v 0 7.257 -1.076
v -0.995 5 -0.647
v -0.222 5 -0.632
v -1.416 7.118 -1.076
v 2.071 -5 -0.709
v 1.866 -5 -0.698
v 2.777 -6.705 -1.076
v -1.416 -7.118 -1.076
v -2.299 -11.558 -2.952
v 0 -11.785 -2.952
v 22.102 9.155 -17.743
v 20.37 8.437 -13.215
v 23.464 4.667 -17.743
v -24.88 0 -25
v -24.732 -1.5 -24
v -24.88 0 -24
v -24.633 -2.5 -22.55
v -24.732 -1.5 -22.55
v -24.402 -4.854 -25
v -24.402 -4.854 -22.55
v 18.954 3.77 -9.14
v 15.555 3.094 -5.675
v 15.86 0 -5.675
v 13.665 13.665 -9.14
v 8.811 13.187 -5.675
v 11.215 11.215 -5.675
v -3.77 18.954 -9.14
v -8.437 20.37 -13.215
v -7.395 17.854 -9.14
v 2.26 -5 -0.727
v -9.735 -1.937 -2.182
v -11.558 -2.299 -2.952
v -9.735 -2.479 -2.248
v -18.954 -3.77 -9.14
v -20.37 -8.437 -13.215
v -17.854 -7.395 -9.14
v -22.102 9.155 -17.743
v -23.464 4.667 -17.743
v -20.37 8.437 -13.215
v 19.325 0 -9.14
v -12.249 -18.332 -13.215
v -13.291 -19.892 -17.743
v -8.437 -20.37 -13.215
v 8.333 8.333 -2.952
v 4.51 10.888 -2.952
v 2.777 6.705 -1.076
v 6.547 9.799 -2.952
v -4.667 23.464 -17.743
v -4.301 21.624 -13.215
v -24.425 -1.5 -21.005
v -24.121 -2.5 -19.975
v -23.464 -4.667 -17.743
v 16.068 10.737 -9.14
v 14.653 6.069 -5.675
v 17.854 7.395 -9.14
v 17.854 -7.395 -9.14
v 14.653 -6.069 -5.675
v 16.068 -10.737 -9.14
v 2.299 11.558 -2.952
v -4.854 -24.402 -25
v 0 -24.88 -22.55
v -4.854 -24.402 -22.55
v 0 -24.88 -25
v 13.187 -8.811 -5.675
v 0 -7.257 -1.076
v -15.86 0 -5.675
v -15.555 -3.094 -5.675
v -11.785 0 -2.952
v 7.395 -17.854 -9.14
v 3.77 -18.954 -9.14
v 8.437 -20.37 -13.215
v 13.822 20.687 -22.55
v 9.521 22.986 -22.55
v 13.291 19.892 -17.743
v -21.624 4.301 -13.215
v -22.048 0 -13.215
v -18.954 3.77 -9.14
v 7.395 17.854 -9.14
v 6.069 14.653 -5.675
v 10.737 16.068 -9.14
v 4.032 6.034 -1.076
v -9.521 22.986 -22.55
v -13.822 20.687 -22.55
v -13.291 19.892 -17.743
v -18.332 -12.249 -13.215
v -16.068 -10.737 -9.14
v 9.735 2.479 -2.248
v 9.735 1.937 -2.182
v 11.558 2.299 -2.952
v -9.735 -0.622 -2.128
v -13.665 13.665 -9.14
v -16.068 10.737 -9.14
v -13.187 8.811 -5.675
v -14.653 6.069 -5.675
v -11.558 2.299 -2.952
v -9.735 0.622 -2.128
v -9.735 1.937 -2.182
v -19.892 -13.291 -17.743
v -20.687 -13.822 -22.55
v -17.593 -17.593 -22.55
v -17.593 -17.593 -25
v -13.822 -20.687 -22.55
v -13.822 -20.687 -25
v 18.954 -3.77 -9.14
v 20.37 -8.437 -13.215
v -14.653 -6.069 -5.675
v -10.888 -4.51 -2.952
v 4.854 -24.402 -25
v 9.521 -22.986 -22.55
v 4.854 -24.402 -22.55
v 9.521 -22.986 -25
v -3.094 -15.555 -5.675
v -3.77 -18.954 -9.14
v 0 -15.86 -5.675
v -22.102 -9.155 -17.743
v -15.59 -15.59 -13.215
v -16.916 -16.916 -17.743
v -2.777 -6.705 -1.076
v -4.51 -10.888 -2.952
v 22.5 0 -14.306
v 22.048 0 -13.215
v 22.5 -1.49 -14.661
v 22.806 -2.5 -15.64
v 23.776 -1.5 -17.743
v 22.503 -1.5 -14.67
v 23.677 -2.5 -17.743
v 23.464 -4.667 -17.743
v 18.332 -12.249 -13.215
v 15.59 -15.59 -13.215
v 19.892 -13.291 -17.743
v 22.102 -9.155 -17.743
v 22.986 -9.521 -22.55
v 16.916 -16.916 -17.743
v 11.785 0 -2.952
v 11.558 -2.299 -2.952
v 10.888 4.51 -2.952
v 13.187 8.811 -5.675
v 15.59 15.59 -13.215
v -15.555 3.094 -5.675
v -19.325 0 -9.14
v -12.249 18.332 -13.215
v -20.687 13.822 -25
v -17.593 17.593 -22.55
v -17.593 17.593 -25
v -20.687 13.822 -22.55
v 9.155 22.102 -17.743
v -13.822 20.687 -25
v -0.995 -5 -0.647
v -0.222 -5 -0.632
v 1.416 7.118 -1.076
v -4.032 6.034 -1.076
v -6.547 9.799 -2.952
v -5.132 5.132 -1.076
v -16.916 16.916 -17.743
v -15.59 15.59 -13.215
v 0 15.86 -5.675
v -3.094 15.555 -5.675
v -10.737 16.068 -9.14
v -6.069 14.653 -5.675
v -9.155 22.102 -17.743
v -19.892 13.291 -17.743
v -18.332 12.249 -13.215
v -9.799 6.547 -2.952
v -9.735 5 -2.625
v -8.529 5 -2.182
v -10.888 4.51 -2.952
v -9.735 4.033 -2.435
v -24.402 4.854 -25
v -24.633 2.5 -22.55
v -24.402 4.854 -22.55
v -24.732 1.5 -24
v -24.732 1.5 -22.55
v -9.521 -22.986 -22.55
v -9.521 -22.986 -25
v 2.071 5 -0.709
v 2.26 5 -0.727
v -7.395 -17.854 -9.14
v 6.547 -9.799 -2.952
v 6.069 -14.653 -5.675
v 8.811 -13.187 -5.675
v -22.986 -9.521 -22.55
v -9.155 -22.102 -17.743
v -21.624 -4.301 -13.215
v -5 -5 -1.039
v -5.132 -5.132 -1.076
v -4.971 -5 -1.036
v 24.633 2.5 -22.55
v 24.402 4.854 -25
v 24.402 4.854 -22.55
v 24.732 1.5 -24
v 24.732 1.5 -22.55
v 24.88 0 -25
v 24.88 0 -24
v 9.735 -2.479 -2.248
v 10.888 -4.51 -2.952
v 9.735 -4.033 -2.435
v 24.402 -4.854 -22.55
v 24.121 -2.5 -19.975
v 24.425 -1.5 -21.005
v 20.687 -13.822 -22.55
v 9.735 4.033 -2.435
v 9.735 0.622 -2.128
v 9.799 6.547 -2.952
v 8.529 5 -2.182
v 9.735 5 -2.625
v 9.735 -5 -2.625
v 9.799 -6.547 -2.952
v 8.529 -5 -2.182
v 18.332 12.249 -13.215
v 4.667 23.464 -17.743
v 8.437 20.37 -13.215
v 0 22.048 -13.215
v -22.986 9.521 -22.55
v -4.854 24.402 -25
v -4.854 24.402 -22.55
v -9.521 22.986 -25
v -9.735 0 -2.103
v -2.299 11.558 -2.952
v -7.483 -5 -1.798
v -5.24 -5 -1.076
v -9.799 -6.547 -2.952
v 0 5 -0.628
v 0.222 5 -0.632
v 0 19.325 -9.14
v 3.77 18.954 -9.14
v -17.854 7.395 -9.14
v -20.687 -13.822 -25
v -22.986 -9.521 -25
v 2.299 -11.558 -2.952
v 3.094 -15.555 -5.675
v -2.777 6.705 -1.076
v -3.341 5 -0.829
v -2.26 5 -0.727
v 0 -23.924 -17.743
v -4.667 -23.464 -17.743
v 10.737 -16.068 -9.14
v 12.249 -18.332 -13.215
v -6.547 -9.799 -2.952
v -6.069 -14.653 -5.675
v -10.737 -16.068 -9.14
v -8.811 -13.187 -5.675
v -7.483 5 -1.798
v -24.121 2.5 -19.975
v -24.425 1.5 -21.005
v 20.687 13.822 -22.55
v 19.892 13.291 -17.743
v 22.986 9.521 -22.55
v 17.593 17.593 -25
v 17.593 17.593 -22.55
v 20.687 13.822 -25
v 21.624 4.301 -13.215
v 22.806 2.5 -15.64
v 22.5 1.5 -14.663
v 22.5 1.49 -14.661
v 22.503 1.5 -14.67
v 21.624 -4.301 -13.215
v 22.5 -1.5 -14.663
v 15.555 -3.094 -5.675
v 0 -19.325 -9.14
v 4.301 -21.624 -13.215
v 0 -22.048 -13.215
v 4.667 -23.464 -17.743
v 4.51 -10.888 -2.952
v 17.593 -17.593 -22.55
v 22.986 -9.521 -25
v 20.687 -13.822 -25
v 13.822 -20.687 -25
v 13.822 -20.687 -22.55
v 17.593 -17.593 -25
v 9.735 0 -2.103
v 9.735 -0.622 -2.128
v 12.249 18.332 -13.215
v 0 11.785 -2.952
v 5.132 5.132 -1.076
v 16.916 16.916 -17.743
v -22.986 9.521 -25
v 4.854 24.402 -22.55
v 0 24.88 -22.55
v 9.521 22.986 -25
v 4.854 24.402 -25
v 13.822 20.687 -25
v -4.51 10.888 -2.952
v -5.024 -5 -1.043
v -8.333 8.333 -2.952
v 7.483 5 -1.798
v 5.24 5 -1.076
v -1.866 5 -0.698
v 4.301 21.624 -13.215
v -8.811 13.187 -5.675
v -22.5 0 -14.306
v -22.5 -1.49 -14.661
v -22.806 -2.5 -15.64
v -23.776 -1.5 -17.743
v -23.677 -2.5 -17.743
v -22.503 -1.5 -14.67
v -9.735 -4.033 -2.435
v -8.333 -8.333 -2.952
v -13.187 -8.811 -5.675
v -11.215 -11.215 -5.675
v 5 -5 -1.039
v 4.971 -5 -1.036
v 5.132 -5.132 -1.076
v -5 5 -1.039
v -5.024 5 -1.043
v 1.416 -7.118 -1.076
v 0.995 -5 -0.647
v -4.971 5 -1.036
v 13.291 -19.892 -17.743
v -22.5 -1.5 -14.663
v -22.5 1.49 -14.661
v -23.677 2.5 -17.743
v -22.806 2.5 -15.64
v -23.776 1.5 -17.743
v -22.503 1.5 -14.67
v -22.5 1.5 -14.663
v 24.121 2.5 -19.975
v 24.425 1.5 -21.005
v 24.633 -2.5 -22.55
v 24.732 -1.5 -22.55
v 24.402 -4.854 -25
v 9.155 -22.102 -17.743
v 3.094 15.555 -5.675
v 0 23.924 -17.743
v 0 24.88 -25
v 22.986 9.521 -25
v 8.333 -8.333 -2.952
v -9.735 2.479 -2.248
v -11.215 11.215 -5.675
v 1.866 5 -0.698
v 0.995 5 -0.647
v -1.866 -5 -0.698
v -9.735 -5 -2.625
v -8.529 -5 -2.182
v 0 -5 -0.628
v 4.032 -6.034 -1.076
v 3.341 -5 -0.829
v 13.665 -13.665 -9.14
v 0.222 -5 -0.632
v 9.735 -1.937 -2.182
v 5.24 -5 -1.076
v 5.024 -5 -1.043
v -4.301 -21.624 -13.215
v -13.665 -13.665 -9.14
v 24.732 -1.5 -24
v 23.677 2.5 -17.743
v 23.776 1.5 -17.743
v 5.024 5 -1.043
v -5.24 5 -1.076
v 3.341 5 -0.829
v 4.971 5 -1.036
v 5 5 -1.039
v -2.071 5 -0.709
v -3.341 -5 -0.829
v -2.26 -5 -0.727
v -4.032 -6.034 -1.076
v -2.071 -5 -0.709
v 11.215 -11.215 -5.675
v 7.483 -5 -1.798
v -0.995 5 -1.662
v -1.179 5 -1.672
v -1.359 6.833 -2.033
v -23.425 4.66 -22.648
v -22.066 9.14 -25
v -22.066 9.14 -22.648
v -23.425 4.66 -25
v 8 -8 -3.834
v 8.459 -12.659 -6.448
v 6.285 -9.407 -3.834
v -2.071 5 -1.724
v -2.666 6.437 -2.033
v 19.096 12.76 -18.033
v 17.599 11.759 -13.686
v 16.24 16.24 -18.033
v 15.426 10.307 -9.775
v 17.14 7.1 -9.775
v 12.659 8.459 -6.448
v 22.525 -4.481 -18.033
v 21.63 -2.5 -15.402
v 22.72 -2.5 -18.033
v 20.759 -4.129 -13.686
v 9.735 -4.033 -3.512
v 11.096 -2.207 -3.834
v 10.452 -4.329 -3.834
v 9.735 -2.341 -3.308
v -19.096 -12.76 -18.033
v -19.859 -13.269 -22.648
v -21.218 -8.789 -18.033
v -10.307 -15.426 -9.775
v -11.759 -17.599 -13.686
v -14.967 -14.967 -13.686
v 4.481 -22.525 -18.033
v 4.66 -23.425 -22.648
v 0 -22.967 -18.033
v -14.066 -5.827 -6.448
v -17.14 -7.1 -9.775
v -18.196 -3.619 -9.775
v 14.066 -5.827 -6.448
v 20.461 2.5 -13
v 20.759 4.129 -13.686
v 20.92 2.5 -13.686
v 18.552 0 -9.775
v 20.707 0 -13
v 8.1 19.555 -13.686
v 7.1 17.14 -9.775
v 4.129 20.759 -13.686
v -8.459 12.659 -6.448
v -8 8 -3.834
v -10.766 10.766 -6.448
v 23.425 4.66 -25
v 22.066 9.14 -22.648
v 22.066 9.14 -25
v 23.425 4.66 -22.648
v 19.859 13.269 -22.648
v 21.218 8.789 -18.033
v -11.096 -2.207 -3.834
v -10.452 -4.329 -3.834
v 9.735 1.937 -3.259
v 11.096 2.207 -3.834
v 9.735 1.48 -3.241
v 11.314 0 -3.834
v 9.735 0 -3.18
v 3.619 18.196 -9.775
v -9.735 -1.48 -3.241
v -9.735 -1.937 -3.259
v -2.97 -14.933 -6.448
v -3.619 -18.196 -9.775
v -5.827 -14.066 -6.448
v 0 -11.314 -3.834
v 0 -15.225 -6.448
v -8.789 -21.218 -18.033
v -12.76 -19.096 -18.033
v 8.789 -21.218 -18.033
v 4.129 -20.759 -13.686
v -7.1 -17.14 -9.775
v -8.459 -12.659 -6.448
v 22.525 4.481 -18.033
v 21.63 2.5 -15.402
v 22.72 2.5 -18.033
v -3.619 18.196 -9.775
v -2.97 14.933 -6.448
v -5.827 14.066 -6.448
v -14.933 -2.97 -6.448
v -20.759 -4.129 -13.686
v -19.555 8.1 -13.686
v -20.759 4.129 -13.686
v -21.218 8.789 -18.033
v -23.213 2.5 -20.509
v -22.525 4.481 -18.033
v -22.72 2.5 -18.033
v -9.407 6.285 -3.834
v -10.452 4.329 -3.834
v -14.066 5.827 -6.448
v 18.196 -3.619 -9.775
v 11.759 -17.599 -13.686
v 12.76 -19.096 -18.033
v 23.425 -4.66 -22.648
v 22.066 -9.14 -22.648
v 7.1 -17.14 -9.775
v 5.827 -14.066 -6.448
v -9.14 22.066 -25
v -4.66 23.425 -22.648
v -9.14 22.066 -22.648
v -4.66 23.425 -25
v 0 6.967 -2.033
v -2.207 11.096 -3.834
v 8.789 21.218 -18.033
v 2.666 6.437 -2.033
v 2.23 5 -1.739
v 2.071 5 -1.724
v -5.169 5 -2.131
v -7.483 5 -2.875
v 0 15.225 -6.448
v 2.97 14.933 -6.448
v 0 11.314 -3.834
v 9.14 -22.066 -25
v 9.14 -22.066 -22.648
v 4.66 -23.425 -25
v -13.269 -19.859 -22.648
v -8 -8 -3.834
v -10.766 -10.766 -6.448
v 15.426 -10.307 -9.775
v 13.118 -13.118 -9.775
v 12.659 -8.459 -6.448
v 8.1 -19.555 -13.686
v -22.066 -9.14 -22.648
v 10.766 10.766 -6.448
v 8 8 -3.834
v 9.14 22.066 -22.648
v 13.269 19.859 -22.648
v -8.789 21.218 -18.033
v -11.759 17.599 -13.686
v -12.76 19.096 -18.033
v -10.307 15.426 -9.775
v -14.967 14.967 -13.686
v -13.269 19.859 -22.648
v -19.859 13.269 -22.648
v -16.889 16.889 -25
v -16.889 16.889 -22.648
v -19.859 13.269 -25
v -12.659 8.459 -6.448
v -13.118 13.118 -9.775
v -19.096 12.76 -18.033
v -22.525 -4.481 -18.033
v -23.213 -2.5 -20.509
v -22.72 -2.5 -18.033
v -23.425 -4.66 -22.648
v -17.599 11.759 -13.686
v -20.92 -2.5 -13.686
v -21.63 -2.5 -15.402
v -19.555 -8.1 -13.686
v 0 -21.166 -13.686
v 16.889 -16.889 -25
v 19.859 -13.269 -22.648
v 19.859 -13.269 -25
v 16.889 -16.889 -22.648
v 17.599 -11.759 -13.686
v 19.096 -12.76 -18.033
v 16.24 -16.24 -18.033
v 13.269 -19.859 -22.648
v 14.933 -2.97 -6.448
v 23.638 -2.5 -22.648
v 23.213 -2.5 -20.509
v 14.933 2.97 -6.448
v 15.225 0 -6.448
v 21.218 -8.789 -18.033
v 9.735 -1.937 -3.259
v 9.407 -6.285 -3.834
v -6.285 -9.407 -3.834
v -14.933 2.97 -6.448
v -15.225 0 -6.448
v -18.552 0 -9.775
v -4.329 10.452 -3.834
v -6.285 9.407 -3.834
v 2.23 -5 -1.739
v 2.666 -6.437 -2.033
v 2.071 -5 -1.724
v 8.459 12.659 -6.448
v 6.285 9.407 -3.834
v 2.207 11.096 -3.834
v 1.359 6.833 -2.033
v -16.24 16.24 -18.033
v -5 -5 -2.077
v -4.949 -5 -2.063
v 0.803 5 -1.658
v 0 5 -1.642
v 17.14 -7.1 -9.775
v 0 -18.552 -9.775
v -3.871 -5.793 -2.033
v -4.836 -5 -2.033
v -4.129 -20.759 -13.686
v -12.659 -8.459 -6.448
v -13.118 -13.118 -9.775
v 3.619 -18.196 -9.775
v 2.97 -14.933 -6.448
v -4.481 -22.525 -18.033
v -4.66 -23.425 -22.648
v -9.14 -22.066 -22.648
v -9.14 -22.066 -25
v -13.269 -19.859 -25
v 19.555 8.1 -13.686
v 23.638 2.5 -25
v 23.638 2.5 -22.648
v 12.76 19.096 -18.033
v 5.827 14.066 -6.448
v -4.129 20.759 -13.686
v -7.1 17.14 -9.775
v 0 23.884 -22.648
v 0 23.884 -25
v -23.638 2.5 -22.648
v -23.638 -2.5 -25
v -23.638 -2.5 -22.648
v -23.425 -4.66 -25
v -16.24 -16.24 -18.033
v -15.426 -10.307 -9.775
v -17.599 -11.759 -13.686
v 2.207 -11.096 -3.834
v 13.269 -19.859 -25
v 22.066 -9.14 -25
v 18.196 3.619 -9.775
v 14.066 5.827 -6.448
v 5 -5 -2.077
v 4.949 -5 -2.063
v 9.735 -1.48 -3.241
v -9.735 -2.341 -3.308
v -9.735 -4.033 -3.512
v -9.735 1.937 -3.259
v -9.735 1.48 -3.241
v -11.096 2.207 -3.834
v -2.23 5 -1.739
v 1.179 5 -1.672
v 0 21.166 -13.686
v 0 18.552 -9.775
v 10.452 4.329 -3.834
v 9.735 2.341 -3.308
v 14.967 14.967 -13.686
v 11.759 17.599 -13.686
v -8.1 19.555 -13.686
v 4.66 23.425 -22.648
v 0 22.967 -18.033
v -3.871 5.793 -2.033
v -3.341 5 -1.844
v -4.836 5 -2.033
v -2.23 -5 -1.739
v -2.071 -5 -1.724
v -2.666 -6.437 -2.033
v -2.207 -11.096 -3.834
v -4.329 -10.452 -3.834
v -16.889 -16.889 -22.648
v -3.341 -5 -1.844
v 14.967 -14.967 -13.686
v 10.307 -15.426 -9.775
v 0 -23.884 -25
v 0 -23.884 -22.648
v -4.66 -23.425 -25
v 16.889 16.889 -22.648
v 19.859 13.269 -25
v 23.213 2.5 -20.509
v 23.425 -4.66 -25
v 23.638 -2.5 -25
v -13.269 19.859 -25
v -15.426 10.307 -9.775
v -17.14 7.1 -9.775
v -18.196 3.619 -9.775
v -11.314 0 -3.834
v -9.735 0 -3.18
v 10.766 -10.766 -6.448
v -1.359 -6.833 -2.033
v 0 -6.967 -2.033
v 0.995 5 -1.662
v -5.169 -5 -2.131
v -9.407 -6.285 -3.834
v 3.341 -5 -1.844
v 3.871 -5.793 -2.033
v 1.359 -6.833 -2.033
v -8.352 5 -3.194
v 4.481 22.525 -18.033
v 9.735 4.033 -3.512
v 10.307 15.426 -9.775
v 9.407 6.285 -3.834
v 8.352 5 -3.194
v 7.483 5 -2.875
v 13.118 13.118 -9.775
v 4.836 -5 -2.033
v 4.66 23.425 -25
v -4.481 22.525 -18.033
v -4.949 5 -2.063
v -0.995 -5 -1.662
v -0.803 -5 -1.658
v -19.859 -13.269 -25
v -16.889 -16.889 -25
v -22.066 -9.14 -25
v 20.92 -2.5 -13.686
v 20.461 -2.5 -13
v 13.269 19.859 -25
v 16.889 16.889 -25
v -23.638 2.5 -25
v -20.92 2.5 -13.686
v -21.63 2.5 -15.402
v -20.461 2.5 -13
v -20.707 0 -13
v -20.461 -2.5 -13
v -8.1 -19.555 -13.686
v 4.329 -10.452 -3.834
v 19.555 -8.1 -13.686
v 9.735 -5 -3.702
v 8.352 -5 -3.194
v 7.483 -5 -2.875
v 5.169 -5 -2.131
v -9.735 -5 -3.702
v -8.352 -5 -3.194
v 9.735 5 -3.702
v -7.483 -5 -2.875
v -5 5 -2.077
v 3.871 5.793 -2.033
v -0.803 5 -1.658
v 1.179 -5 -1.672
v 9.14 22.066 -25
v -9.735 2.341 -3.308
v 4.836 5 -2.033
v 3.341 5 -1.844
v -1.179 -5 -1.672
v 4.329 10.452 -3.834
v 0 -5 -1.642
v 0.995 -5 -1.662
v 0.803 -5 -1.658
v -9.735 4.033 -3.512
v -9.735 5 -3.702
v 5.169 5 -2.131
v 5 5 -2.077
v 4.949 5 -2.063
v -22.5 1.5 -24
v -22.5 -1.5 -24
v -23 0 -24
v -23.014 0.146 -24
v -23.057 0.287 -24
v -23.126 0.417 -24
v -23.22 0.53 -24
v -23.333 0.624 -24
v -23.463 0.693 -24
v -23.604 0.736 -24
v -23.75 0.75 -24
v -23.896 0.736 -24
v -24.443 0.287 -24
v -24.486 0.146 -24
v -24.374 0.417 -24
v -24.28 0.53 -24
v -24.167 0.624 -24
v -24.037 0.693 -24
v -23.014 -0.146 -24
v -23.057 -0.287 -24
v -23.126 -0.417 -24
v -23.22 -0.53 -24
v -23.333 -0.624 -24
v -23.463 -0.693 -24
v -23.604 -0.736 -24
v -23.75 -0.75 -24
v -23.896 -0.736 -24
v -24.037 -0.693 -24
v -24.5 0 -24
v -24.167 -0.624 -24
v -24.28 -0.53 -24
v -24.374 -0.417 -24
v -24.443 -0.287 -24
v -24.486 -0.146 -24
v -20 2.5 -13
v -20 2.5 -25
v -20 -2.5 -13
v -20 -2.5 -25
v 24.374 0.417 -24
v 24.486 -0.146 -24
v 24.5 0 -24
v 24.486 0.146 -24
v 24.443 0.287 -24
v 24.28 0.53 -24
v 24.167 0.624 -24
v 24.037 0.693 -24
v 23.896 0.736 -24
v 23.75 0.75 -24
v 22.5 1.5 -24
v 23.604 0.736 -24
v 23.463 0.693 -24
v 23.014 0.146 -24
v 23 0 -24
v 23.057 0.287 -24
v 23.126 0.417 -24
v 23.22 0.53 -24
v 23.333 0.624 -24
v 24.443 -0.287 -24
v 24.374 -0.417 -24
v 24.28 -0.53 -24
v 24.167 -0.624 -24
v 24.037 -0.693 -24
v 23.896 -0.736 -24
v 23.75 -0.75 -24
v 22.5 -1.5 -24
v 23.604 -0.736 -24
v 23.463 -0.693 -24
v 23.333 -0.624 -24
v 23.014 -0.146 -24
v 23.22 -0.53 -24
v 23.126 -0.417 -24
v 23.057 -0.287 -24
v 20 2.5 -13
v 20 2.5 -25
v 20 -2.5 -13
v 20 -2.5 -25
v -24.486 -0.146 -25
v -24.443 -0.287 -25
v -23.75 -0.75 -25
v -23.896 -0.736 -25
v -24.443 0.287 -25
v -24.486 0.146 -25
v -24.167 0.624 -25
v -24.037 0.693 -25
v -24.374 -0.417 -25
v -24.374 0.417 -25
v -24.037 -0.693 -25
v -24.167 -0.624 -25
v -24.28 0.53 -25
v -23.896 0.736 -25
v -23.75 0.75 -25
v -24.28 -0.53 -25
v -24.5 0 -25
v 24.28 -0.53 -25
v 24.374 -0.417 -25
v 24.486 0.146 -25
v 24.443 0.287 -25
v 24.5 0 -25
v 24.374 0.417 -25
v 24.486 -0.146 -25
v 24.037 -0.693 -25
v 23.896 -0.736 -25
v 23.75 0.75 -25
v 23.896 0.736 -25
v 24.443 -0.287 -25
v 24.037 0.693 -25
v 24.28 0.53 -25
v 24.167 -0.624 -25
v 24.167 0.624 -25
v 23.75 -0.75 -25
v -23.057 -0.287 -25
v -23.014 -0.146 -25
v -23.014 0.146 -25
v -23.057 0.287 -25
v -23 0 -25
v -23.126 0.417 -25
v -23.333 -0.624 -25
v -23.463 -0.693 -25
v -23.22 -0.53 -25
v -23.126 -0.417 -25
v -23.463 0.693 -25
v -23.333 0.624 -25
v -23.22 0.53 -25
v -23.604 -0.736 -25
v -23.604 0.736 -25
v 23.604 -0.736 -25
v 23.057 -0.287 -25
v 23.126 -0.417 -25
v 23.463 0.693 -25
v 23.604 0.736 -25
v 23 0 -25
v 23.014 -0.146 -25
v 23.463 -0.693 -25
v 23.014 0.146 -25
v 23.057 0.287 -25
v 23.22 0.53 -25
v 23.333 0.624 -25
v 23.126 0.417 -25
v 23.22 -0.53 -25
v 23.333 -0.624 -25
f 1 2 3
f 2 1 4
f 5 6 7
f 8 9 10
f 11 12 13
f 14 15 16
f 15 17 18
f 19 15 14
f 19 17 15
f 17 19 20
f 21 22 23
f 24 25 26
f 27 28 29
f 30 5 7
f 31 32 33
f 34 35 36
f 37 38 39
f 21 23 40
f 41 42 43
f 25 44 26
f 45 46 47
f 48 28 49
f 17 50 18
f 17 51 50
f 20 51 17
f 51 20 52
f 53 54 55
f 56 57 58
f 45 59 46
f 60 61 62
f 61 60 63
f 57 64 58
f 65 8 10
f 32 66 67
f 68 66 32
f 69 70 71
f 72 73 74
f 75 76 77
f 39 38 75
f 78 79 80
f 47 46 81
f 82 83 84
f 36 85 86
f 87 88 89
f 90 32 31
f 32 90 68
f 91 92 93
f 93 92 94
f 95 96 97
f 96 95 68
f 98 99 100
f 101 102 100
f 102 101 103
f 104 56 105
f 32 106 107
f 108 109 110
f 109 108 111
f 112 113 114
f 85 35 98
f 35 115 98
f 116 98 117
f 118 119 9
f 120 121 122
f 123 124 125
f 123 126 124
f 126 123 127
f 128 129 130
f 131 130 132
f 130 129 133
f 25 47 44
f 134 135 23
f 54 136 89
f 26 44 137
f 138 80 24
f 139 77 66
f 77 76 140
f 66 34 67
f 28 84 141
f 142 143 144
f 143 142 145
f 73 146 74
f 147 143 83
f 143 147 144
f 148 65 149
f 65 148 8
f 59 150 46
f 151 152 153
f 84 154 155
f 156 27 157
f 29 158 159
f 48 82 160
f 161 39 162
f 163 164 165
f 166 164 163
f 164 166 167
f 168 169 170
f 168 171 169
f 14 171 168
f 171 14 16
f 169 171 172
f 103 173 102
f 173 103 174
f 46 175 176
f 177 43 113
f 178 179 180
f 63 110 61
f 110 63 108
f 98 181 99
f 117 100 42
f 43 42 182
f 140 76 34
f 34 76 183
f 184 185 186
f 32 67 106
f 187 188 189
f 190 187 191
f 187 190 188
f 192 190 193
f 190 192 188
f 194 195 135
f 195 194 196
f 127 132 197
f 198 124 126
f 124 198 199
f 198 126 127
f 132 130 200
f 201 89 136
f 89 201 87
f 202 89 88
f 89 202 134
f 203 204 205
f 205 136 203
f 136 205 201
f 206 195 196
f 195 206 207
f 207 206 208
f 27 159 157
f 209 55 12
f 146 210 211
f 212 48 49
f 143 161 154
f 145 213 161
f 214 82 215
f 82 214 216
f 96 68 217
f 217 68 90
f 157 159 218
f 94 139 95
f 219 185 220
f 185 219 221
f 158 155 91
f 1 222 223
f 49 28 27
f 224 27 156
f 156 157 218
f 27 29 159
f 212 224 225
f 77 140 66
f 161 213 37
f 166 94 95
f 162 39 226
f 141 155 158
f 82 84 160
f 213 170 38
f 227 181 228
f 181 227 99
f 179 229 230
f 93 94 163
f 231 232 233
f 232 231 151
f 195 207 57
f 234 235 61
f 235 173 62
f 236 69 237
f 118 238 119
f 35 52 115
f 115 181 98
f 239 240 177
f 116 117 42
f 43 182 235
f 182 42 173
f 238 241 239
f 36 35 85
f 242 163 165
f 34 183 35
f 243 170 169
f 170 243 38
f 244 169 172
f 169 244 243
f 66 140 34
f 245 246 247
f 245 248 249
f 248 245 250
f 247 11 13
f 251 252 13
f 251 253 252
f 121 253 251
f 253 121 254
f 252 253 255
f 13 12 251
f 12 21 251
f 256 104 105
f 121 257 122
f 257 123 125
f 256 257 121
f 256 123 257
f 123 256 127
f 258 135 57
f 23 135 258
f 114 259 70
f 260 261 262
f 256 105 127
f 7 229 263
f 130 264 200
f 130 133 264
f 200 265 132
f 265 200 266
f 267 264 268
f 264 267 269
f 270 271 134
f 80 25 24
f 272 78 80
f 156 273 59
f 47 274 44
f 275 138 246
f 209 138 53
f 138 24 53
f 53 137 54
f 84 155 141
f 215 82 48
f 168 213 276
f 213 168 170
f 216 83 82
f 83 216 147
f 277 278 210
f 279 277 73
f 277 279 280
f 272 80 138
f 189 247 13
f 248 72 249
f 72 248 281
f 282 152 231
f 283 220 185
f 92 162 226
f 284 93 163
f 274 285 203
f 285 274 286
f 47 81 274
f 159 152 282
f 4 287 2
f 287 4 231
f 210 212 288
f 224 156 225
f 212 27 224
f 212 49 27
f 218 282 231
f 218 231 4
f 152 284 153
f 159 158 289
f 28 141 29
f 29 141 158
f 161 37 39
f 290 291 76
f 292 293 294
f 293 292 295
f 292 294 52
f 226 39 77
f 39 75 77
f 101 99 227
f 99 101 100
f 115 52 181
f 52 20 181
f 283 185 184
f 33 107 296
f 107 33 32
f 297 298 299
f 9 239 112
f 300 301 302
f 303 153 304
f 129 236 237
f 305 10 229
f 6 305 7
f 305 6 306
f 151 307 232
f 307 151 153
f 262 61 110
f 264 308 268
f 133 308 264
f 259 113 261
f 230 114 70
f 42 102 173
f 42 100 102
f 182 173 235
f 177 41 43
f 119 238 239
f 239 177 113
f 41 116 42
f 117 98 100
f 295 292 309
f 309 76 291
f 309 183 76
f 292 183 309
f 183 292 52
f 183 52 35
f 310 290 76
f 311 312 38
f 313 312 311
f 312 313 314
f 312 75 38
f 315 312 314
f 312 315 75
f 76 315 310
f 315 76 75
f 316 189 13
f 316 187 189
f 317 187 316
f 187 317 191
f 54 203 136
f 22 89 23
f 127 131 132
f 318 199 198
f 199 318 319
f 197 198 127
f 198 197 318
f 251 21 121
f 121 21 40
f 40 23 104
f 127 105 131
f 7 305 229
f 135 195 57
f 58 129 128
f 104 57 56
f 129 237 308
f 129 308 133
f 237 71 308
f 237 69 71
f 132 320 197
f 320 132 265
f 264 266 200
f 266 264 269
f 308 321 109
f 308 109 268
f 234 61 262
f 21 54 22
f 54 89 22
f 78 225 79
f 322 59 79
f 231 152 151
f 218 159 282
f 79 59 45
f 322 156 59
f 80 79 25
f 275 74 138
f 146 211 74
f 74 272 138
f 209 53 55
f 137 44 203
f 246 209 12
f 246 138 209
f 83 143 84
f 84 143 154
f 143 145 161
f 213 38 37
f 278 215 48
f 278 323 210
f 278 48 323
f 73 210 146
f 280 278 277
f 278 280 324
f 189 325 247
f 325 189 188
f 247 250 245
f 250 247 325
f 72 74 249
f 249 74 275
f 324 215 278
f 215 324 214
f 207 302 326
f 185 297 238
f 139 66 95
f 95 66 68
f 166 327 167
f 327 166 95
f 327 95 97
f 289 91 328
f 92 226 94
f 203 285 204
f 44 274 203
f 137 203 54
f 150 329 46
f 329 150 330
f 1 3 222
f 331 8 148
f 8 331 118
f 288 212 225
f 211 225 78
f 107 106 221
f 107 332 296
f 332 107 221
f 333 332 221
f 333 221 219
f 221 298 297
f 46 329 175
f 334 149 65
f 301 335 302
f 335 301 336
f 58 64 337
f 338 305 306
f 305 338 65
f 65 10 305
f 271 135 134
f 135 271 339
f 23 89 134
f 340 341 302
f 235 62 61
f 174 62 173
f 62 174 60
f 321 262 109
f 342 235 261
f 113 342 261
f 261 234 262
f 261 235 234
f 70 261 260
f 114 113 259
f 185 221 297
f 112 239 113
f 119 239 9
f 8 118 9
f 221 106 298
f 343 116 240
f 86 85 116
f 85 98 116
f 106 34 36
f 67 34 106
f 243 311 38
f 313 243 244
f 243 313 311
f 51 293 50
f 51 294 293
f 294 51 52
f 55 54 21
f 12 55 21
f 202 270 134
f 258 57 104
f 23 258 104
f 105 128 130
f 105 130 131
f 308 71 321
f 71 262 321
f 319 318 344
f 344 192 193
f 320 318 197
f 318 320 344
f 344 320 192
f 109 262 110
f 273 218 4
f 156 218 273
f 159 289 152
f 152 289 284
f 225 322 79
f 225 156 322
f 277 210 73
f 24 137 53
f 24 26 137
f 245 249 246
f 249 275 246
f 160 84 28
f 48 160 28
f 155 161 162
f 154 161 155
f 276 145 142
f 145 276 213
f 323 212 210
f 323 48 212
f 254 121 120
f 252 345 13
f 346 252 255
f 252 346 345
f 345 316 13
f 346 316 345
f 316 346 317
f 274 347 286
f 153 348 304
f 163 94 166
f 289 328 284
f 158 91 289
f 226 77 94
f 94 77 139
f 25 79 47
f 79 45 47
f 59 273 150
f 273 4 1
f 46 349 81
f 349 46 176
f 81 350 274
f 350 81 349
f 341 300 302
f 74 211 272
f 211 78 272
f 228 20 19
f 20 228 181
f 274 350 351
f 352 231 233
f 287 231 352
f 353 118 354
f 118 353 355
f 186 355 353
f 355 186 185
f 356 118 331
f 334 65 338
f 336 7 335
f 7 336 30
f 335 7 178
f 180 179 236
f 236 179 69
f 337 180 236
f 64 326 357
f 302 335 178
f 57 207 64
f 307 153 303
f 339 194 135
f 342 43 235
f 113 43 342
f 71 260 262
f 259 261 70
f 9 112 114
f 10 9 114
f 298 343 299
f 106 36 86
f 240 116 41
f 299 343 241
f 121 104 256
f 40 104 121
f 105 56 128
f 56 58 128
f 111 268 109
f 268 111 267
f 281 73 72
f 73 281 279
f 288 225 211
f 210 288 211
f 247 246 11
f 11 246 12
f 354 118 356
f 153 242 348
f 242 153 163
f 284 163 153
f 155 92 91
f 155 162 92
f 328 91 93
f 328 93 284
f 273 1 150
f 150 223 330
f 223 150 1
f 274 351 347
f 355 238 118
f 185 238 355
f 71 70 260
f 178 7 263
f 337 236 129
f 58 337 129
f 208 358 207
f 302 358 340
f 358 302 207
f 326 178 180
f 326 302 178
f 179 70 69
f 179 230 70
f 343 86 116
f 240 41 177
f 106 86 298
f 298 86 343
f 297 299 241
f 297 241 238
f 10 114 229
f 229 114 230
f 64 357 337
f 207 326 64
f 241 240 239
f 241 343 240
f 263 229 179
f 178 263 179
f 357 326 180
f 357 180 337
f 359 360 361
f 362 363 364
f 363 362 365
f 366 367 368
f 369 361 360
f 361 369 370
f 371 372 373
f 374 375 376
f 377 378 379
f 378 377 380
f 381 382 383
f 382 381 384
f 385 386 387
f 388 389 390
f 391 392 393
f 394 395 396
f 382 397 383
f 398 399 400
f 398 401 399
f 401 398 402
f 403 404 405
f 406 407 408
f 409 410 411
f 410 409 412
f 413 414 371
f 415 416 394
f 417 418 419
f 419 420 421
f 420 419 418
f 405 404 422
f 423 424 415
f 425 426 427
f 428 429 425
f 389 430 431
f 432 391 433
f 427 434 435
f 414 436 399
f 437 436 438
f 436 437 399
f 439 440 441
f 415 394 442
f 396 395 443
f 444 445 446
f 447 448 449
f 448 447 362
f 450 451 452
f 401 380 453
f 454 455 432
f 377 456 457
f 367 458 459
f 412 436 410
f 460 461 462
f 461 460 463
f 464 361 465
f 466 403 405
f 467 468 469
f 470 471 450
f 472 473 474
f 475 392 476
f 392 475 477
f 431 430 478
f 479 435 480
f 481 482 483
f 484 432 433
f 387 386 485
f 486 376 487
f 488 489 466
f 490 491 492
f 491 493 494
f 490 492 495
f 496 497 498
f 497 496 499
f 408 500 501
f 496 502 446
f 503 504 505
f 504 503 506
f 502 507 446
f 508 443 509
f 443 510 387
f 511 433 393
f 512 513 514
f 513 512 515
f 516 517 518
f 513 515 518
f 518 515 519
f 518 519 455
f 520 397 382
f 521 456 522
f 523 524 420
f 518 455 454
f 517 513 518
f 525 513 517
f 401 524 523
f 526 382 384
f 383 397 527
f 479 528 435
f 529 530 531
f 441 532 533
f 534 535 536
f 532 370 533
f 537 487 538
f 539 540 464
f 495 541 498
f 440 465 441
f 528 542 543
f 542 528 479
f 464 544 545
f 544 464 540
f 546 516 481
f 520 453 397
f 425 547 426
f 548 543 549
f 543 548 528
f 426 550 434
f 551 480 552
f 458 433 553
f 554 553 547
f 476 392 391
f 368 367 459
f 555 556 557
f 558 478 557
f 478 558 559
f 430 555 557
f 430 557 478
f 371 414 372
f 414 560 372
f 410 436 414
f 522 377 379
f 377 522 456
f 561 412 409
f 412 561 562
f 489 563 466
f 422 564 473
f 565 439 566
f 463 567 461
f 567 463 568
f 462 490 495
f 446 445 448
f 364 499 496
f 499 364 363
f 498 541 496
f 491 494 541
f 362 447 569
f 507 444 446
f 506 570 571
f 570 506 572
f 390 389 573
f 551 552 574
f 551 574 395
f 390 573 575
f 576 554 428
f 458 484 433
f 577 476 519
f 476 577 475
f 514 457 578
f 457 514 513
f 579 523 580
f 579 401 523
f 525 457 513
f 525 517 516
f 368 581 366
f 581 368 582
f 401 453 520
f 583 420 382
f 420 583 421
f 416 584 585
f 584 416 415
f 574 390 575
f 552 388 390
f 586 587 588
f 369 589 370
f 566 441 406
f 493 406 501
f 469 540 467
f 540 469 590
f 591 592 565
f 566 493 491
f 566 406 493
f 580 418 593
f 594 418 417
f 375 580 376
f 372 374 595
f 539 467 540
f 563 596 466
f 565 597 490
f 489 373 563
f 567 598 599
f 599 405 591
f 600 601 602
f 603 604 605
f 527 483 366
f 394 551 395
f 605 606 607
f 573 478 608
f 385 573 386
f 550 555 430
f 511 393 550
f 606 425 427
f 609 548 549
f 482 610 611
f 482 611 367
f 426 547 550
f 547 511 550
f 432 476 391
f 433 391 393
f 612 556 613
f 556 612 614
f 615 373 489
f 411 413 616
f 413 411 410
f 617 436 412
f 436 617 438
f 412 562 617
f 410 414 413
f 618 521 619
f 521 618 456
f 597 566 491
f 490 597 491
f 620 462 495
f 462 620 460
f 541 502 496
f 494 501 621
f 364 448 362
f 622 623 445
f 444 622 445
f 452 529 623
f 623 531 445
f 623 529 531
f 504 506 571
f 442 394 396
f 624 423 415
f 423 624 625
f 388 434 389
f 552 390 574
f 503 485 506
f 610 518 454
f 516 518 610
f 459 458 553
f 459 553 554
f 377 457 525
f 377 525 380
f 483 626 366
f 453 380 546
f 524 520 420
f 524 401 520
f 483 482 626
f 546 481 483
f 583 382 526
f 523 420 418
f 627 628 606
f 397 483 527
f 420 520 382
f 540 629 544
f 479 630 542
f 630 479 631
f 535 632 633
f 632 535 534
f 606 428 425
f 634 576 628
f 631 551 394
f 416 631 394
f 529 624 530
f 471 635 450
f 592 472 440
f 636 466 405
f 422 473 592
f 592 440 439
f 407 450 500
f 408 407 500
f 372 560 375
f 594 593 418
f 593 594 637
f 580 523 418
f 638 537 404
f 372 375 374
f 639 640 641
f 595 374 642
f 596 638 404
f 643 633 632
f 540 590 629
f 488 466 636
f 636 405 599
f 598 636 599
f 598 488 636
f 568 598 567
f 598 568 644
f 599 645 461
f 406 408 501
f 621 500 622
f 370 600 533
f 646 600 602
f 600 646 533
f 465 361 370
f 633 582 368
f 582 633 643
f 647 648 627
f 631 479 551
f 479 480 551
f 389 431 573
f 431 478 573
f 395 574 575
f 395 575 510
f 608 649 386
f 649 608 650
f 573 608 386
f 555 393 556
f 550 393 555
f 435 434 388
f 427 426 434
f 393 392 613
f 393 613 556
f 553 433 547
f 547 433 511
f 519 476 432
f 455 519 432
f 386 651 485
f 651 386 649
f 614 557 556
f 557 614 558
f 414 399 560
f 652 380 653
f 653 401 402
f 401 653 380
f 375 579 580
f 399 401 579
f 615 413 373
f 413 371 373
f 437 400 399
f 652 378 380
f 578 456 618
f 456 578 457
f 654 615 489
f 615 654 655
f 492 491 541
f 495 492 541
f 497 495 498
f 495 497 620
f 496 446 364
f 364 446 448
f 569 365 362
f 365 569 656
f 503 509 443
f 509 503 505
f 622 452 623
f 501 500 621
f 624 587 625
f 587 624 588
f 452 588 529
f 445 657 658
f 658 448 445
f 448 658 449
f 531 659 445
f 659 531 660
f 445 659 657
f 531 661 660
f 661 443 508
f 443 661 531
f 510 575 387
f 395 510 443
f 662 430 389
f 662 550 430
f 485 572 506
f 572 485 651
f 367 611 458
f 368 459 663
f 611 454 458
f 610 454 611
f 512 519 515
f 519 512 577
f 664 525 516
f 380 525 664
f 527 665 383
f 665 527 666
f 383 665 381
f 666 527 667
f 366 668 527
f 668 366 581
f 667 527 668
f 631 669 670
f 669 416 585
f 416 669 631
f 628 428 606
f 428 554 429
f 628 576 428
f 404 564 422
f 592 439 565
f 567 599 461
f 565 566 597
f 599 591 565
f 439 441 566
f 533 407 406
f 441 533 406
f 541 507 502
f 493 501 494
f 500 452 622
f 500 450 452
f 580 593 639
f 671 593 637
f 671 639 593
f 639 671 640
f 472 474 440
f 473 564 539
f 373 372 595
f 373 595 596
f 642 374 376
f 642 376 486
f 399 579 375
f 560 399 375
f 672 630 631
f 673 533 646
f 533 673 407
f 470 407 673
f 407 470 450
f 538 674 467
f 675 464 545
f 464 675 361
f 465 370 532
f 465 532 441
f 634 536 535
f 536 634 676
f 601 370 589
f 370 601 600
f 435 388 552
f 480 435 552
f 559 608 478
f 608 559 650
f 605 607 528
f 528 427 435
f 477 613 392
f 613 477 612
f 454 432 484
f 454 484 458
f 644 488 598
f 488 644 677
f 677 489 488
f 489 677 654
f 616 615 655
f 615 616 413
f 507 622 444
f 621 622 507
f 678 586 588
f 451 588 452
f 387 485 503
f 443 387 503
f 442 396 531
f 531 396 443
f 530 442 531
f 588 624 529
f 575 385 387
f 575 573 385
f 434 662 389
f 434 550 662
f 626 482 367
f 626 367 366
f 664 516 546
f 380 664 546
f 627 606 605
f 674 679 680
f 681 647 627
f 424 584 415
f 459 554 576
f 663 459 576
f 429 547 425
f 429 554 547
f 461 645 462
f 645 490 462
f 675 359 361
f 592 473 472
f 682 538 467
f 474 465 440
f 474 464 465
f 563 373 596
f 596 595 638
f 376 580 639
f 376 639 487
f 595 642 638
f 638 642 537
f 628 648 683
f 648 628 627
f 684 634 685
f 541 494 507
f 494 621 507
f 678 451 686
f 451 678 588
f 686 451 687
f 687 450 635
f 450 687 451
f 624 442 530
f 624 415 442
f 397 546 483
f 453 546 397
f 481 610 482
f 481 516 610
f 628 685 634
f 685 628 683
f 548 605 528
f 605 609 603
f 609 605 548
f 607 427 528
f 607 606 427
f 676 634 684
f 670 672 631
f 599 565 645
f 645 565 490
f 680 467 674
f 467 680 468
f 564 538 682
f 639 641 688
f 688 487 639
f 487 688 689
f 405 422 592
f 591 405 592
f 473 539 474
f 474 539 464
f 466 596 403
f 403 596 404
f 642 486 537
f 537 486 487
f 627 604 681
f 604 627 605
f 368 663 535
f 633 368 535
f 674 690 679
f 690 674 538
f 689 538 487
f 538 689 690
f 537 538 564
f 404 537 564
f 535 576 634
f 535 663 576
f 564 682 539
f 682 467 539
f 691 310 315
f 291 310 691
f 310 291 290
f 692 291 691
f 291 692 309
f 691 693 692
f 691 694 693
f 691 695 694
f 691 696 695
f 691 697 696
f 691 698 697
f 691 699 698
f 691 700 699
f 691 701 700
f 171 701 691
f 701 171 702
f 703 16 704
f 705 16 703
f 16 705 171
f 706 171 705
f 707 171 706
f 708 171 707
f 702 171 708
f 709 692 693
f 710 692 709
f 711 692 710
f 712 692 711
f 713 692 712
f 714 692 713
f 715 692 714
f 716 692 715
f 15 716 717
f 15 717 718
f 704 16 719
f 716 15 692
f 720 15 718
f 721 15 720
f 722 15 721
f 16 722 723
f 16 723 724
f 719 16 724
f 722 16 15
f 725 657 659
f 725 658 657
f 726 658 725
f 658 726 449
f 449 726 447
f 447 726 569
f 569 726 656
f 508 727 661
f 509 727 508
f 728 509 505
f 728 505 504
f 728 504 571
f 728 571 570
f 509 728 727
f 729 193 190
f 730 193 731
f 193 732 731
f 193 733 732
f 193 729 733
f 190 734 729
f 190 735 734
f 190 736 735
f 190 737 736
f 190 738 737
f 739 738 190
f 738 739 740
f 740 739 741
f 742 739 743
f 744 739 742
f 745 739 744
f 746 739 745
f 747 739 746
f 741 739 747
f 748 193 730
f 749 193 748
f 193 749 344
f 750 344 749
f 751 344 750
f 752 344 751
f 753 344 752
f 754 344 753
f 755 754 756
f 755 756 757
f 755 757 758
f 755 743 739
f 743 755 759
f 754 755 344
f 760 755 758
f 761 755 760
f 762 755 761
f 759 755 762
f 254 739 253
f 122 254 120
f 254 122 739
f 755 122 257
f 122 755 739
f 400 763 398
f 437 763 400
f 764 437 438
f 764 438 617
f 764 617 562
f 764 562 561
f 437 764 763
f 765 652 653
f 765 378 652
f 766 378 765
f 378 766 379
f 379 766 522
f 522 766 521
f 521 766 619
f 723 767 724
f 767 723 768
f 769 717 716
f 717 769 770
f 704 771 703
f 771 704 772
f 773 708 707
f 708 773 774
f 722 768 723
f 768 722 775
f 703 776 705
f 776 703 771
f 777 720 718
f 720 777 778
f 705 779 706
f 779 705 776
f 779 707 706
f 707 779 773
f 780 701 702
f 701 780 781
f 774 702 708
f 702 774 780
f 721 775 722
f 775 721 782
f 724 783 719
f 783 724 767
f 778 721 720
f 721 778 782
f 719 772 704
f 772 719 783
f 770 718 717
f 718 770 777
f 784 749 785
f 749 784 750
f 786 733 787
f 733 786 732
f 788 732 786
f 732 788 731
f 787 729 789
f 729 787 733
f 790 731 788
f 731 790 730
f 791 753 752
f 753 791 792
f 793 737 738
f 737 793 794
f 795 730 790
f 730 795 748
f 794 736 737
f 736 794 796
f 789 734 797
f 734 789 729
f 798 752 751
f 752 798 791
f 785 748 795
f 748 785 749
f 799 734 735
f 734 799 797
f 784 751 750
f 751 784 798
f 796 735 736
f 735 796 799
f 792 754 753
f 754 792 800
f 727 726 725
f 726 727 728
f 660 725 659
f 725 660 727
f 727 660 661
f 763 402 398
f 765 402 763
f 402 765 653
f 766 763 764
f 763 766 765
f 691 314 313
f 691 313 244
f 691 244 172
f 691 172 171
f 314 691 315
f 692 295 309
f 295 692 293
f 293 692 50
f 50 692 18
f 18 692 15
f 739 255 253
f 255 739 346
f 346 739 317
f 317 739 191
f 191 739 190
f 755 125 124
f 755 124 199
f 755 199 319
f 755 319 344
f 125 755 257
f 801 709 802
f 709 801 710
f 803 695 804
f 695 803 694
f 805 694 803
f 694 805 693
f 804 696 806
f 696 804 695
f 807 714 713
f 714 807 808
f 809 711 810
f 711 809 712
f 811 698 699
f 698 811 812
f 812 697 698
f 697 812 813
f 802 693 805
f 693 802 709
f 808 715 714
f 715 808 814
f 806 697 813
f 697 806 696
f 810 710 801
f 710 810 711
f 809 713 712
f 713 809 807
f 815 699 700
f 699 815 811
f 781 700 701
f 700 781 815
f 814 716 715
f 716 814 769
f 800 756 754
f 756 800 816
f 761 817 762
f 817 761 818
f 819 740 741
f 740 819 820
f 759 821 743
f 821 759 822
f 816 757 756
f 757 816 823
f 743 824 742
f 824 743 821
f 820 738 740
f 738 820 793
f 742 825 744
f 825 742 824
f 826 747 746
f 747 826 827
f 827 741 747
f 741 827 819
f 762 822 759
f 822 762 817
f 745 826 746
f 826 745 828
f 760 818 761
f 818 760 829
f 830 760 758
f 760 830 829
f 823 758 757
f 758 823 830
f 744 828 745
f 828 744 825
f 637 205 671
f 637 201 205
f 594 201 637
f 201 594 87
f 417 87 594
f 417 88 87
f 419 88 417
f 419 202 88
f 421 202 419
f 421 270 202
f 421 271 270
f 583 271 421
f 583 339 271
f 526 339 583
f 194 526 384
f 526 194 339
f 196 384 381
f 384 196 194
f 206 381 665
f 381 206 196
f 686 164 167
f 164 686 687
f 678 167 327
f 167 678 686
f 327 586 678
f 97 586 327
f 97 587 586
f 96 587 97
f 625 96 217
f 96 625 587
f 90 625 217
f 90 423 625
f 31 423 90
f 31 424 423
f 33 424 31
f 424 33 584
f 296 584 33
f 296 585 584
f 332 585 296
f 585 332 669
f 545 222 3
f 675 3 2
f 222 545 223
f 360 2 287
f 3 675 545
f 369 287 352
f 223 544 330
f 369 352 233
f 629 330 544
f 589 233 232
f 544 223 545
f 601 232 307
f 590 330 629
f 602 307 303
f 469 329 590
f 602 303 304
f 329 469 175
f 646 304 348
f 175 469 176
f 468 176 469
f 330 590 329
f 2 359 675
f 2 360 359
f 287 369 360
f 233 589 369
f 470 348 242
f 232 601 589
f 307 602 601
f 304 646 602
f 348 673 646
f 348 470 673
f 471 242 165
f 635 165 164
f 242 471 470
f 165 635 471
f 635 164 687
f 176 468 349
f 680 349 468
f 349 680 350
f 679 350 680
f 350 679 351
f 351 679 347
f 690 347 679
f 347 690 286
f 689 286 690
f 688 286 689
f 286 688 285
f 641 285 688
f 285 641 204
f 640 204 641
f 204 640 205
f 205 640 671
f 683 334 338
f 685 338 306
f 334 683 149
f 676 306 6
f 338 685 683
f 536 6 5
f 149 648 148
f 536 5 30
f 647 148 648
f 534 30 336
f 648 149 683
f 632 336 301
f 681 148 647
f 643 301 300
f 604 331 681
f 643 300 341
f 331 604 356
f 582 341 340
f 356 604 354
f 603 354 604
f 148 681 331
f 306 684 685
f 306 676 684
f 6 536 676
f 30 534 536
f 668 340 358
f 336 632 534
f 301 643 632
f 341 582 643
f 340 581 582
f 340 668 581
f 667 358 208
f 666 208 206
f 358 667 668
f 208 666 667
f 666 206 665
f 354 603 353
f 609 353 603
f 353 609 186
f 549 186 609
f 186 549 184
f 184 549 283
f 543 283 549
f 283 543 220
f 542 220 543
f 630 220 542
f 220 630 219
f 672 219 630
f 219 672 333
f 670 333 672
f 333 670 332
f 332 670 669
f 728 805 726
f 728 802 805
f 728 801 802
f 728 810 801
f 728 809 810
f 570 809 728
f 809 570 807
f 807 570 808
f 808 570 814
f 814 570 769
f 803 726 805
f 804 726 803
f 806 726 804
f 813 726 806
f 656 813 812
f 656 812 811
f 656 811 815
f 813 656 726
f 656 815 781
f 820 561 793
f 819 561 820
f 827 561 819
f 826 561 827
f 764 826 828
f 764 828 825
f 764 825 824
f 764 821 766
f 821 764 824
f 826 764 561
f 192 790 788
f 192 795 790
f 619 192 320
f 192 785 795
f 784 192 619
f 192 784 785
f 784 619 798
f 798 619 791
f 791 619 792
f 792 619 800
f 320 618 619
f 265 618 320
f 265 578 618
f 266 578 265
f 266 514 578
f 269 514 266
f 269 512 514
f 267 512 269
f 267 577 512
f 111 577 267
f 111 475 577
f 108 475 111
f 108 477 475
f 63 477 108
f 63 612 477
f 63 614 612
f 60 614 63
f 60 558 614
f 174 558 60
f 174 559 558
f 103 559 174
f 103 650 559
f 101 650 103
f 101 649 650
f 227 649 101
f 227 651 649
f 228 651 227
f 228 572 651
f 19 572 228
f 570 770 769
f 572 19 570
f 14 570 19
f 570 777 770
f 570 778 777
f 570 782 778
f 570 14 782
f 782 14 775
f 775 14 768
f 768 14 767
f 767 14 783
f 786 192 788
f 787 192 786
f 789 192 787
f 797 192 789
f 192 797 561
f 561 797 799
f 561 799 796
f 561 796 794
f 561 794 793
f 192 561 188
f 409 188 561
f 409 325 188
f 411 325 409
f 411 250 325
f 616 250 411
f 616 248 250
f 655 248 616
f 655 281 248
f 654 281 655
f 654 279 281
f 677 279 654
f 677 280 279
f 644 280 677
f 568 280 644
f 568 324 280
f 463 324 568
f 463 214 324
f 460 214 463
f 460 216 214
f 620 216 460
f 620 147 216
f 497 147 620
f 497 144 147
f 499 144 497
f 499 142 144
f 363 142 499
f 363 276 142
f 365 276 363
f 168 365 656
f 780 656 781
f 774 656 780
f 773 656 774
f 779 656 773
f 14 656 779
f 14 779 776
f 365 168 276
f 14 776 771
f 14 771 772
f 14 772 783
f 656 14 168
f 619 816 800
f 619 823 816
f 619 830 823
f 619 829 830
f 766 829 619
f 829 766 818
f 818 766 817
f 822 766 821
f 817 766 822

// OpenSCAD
DiameterOuterSphere = 50;
wallThickness = 2;
screwDiameter=1.5;
arcLengthOpening=20;
widthOpening=10;
fn = 32;
screwHolesCubeHeight=10;

translate([0, 0, -DiameterOuterSphere/2])difference(){

  // Cube with screw holes
  union(){
    difference(){
      sphere($fn = fn, d=DiameterOuterSphere);
      sphere($fn = fn, d=DiameterOuterSphere-wallThickness);

      //Screw holes
      translate([-DiameterOuterSphere/2, 0, screwHolesCubeHeight/2 + 1])cube([5,5,screwHolesCubeHeight], center = true);
      translate([-DiameterOuterSphere/2, 0, -screwHolesCubeHeight/2 - 1])cube([5,5,screwHolesCubeHeight], center = true);
      translate([DiameterOuterSphere/2, 0, screwHolesCubeHeight/2 + 1])cube([5,5,screwHolesCubeHeight], center = true);
      translate([DiameterOuterSphere/2, 0, -screwHolesCubeHeight/2 - 1])cube([5,5,screwHolesCubeHeight], center = true);
      
      translate([-DiameterOuterSphere/2 +5/4, 0, 0])cylinder($fn=fn, h=2*wallThickness, d=screwDiameter, center=true);
      translate([+DiameterOuterSphere/2 -5/4, 0, 0])cylinder($fn=fn, h=2*wallThickness, d=screwDiameter, center=true);
    }

    difference(){
      union(){
        translate([-DiameterOuterSphere/2+5/2, 0,  (screwHolesCubeHeight+wallThickness)/2])cube([5,5,(screwHolesCubeHeight+wallThickness)], center = true);
        translate([-DiameterOuterSphere/2+5/2, 0, -(screwHolesCubeHeight+wallThickness)/2])cube([5,5,(screwHolesCubeHeight+wallThickness)], center = true);
        translate([ DiameterOuterSphere/2-5/2, 0,   (screwHolesCubeHeight+wallThickness)/2])cube([5,5,(screwHolesCubeHeight+wallThickness)], center = true);
        translate([ DiameterOuterSphere/2-5/2, 0,  -(screwHolesCubeHeight+wallThickness)/2])cube([5,5,(screwHolesCubeHeight+wallThickness)], center = true);
      }
      translate([-DiameterOuterSphere/2 , 0,  screwHolesCubeHeight/2 + wallThickness/2])cube([5,5-wallThickness,screwHolesCubeHeight], center = true);
      translate([-DiameterOuterSphere/2,  0, -screwHolesCubeHeight/2 - wallThickness/2])cube([5,5-wallThickness,screwHolesCubeHeight], center = true);
      translate([ DiameterOuterSphere/2,  0,  screwHolesCubeHeight/2 + wallThickness/2])cube([5,5-wallThickness,screwHolesCubeHeight], center = true);
      translate([ DiameterOuterSphere/2,  0, -screwHolesCubeHeight/2 - wallThickness/2])cube([5,5-wallThickness,screwHolesCubeHeight], center = true);
      
      // Cut out everything outside of sphere
      difference(){
        sphere($fn = fn, d=DiameterOuterSphere+30);
        sphere($fn = fn, d=DiameterOuterSphere);
      }
      
      translate([-DiameterOuterSphere/2 +5/4, 0, 0])cylinder($fn=fn, h=2*wallThickness, d=screwDiameter, center=true);
      translate([+DiameterOuterSphere/2 -5/4, 0, 0])cylinder($fn=fn, h=2*wallThickness, d=screwDiameter, center=true);
    }
  }
  
  lengthOpening=DiameterOuterSphere*sin(arcLengthOpening*360/(2*PI*DiameterOuterSphere/2)/2);
  cube([lengthOpening, widthOpening, DiameterOuterSphere+1], center=true);
  
  //Divider top bottom
  translate([0, 0, -DiameterOuterSphere/4])cube([100, 100, DiameterOuterSphere/2], center=true);
}
